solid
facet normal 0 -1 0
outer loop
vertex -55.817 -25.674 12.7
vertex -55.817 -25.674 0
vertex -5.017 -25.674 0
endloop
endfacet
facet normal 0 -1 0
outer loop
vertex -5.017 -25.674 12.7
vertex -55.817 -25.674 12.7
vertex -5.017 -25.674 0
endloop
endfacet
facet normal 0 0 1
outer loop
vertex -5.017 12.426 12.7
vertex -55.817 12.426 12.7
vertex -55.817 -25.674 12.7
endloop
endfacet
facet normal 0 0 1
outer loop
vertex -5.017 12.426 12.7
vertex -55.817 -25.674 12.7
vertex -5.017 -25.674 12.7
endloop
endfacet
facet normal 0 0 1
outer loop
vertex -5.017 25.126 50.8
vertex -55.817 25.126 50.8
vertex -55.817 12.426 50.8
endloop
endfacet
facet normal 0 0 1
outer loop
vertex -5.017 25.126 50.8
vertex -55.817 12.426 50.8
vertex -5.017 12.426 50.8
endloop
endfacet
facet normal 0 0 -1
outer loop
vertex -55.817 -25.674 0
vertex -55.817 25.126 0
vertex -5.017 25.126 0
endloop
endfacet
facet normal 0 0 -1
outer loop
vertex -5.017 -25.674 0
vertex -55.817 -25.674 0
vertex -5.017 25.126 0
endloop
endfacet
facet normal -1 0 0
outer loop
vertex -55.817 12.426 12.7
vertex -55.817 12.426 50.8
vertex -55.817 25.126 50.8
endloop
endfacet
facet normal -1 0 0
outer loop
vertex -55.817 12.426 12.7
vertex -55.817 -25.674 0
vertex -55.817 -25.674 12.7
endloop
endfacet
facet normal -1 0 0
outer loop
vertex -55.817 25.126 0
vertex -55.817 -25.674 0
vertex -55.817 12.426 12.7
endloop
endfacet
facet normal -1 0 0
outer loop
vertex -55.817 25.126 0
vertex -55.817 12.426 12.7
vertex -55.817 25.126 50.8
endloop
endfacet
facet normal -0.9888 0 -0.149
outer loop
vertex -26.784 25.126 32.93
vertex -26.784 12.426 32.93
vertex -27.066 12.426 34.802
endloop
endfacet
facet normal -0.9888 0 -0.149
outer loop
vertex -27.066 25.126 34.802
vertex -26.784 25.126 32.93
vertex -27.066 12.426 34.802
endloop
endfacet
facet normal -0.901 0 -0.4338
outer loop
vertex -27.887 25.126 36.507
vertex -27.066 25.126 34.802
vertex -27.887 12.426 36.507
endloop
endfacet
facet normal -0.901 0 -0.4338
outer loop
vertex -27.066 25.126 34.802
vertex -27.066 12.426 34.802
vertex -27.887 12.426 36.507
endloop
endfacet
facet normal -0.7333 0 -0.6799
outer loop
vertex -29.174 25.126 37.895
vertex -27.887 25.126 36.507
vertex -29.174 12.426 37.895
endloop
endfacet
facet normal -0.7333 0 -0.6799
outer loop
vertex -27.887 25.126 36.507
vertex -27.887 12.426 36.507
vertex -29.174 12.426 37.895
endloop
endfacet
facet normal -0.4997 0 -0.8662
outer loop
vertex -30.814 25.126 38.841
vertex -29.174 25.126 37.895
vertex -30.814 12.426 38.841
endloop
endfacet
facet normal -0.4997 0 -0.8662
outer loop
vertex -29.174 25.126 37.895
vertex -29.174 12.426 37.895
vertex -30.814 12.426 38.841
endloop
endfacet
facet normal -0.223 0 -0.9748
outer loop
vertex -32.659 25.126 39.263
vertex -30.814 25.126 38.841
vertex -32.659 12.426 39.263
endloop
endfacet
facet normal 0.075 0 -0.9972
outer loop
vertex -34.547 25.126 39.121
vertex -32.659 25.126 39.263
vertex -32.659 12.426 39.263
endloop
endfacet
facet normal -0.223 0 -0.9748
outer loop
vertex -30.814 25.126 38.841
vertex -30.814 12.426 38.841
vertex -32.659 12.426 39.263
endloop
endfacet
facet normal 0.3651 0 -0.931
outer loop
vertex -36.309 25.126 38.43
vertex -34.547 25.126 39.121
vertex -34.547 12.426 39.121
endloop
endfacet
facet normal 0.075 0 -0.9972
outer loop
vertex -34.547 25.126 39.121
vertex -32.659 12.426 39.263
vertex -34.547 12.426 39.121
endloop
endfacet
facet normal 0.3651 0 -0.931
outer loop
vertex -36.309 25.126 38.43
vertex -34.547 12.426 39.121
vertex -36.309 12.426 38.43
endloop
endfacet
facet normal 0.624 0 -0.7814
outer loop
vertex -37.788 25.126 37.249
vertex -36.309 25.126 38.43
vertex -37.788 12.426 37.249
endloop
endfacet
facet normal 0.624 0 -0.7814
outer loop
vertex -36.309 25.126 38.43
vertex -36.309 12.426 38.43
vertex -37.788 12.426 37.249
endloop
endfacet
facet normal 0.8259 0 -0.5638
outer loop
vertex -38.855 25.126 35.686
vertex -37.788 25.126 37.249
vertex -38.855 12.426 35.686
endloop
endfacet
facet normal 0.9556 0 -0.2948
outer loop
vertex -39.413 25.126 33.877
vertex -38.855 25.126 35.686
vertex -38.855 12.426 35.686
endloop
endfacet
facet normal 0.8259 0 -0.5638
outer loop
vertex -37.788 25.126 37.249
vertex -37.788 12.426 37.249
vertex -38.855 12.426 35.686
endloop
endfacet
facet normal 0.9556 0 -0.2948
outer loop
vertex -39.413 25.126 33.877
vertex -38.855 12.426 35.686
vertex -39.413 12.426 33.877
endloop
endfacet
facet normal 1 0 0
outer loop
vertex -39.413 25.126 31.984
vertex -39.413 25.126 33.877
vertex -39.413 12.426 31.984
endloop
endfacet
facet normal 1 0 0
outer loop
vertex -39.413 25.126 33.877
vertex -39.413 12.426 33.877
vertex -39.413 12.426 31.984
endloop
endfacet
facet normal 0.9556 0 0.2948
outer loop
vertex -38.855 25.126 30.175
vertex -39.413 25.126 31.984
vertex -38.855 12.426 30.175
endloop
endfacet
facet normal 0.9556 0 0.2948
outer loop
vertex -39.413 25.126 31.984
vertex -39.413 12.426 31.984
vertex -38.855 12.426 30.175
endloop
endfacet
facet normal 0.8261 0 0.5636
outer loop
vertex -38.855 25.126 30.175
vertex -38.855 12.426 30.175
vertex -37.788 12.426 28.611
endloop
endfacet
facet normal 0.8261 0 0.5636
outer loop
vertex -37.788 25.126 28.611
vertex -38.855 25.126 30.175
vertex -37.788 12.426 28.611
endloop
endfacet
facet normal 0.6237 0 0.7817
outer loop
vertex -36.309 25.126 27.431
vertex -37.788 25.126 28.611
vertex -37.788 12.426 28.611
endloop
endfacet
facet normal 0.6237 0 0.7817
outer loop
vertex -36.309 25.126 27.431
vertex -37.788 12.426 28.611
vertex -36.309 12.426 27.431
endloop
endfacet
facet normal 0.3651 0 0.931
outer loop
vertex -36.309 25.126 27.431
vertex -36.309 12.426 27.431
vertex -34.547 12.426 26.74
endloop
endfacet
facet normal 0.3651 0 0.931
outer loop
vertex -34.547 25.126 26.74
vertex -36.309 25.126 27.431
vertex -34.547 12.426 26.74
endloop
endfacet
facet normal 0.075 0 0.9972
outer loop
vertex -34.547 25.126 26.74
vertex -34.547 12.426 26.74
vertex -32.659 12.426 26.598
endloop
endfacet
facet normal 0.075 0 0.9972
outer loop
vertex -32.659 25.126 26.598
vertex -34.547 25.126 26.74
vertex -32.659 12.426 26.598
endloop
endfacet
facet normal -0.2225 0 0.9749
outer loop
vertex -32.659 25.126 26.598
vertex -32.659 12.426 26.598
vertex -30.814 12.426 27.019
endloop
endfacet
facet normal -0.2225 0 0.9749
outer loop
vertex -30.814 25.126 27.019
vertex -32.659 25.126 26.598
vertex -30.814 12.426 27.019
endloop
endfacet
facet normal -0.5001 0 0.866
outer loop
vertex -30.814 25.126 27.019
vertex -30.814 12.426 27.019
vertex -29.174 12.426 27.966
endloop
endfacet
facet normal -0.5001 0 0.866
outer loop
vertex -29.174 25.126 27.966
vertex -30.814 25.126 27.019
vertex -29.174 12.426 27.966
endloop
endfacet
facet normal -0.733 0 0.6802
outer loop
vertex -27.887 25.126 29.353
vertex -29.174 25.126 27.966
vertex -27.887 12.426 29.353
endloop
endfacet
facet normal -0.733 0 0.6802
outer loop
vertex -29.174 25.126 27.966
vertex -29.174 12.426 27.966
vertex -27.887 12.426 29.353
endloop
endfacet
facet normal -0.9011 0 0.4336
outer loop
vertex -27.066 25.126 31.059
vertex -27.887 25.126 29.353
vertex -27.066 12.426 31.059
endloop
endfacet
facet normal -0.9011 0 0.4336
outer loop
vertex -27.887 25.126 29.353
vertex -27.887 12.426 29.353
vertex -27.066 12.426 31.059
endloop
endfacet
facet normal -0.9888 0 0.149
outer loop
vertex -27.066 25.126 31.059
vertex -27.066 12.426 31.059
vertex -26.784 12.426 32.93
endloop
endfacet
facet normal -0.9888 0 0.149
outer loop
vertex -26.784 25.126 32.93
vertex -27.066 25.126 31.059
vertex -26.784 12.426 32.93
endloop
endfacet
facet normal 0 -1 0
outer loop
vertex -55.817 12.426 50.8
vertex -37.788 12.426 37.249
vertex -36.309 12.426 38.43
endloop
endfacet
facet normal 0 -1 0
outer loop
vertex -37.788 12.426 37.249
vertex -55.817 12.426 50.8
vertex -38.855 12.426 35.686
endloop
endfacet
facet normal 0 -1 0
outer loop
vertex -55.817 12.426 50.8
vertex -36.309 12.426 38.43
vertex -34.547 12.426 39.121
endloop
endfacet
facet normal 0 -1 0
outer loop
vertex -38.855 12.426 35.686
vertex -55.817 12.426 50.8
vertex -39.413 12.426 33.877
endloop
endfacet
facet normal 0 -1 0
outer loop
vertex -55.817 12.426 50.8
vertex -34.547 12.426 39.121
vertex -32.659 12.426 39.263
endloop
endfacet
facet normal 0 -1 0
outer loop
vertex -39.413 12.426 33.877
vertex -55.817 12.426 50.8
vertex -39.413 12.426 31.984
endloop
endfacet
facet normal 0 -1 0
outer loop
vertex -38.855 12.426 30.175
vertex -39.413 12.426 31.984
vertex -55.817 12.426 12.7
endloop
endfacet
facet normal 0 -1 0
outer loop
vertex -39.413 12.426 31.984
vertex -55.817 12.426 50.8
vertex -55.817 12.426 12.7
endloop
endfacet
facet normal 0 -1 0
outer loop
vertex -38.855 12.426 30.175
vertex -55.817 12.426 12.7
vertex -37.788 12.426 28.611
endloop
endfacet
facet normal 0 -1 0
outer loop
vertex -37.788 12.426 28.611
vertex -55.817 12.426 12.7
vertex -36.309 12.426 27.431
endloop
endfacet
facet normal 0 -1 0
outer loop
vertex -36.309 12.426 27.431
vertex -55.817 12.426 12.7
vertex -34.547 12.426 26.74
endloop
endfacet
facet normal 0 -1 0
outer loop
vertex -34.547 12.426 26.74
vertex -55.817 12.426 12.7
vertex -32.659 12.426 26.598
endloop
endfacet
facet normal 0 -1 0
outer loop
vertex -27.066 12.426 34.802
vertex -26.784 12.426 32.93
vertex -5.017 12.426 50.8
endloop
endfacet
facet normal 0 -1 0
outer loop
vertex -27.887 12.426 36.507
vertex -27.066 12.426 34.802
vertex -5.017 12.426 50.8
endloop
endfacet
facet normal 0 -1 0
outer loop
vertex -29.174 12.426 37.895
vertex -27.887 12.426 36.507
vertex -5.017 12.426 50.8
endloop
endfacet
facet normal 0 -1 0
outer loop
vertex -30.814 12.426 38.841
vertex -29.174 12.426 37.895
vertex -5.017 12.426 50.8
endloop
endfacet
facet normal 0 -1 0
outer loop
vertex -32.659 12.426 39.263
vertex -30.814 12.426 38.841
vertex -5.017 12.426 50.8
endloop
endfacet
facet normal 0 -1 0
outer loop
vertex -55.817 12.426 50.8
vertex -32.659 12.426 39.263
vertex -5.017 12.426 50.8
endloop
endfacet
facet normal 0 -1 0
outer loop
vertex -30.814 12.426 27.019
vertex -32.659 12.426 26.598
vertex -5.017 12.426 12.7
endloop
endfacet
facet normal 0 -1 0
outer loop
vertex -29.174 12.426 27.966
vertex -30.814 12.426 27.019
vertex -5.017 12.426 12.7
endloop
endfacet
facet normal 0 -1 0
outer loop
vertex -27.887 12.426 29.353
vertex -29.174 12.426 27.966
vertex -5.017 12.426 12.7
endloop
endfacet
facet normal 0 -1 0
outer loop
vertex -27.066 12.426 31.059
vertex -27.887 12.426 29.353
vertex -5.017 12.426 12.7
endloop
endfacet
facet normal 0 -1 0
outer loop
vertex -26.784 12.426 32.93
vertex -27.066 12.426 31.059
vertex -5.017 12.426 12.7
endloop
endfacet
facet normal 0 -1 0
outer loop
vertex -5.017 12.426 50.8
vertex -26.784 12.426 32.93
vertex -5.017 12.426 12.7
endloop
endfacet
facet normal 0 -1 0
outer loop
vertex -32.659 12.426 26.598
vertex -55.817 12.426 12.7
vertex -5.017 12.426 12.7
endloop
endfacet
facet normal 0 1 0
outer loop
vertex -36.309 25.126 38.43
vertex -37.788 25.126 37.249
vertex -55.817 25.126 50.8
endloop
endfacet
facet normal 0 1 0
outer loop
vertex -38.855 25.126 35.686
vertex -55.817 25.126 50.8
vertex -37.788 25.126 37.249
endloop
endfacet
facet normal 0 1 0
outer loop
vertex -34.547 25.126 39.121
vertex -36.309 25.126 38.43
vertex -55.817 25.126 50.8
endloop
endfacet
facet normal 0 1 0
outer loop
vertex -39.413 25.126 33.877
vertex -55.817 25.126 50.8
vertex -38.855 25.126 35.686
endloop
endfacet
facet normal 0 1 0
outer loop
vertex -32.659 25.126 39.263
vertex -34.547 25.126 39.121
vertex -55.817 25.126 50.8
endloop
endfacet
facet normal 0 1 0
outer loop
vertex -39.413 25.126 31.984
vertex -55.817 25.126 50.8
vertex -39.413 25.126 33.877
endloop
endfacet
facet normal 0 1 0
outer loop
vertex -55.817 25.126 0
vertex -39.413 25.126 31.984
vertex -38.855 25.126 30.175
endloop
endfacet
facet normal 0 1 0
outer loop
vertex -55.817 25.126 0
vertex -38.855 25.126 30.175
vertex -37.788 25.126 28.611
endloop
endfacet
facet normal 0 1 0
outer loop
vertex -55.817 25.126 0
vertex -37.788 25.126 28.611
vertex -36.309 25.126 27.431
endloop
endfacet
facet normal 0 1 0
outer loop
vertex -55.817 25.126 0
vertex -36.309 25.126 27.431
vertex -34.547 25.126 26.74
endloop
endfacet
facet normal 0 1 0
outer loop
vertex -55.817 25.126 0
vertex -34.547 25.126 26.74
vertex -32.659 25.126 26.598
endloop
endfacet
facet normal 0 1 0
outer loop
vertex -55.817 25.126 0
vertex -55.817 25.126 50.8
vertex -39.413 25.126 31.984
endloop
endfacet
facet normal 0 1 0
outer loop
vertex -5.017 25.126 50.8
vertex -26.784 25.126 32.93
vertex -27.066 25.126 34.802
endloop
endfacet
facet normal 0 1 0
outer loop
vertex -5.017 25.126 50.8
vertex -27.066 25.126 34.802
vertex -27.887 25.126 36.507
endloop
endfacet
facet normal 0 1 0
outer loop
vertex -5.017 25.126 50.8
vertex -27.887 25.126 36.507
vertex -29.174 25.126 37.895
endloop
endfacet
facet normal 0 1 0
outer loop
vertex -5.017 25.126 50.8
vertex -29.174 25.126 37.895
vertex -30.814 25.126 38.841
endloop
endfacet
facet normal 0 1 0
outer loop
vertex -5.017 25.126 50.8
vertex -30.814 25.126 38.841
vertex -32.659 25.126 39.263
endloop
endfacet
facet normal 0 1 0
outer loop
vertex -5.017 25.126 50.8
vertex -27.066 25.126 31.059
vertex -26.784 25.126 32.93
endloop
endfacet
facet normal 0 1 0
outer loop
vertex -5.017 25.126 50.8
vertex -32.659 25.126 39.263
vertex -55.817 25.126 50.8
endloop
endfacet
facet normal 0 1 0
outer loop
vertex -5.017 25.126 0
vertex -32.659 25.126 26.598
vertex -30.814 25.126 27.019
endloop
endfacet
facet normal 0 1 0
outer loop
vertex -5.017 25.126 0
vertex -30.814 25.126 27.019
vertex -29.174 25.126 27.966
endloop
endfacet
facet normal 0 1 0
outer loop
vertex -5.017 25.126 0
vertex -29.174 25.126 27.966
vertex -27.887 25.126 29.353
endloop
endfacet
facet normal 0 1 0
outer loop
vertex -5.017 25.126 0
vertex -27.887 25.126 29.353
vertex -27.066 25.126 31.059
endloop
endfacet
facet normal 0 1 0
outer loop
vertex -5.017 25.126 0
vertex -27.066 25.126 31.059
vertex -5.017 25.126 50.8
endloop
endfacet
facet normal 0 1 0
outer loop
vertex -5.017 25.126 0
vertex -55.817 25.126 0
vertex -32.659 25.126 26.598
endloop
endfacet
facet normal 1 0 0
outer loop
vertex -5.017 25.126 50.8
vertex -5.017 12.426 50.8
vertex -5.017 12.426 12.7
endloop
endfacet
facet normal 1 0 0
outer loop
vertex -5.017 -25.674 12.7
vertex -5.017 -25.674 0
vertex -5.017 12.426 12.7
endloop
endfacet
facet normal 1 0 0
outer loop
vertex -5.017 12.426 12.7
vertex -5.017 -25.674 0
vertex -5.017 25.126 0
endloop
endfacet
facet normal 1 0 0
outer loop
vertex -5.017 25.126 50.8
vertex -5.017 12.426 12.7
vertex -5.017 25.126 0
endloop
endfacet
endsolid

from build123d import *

# Parameters (mm, degrees)
F0_W     = 50.8
F0_H     = 38.1
F1_DEPTH = 12.7
F0_H_2   = 12.7
F2_DEPTH = 50.8
F3_R     = 6.35
F4_DEPTH = 12.7


with BuildPart() as f1:
    # F0 (on Top) → F1 (new body)
    with BuildSketch(Plane.XY):
        with Locations((-30.416981, -6.624007)):
            Rectangle(F0_W, F0_H)
    extrude(amount=F1_DEPTH)

    # F0 (on Top) → F2 (join)
    with BuildSketch(Plane.XY):
        with Locations((-30.416981, 18.775993)):
            Rectangle(F0_W, F0_H_2)
    extrude(amount=F2_DEPTH)

    # F3 (on face) → F4 (cut)
    with BuildSketch(Plane.XZ.offset(-12.425993)):
        with Locations((-33.133555, 32.930352)):
            Circle(F3_R)
    extrude(amount=-F4_DEPTH, mode=Mode.SUBTRACT)


solid = f1.part
